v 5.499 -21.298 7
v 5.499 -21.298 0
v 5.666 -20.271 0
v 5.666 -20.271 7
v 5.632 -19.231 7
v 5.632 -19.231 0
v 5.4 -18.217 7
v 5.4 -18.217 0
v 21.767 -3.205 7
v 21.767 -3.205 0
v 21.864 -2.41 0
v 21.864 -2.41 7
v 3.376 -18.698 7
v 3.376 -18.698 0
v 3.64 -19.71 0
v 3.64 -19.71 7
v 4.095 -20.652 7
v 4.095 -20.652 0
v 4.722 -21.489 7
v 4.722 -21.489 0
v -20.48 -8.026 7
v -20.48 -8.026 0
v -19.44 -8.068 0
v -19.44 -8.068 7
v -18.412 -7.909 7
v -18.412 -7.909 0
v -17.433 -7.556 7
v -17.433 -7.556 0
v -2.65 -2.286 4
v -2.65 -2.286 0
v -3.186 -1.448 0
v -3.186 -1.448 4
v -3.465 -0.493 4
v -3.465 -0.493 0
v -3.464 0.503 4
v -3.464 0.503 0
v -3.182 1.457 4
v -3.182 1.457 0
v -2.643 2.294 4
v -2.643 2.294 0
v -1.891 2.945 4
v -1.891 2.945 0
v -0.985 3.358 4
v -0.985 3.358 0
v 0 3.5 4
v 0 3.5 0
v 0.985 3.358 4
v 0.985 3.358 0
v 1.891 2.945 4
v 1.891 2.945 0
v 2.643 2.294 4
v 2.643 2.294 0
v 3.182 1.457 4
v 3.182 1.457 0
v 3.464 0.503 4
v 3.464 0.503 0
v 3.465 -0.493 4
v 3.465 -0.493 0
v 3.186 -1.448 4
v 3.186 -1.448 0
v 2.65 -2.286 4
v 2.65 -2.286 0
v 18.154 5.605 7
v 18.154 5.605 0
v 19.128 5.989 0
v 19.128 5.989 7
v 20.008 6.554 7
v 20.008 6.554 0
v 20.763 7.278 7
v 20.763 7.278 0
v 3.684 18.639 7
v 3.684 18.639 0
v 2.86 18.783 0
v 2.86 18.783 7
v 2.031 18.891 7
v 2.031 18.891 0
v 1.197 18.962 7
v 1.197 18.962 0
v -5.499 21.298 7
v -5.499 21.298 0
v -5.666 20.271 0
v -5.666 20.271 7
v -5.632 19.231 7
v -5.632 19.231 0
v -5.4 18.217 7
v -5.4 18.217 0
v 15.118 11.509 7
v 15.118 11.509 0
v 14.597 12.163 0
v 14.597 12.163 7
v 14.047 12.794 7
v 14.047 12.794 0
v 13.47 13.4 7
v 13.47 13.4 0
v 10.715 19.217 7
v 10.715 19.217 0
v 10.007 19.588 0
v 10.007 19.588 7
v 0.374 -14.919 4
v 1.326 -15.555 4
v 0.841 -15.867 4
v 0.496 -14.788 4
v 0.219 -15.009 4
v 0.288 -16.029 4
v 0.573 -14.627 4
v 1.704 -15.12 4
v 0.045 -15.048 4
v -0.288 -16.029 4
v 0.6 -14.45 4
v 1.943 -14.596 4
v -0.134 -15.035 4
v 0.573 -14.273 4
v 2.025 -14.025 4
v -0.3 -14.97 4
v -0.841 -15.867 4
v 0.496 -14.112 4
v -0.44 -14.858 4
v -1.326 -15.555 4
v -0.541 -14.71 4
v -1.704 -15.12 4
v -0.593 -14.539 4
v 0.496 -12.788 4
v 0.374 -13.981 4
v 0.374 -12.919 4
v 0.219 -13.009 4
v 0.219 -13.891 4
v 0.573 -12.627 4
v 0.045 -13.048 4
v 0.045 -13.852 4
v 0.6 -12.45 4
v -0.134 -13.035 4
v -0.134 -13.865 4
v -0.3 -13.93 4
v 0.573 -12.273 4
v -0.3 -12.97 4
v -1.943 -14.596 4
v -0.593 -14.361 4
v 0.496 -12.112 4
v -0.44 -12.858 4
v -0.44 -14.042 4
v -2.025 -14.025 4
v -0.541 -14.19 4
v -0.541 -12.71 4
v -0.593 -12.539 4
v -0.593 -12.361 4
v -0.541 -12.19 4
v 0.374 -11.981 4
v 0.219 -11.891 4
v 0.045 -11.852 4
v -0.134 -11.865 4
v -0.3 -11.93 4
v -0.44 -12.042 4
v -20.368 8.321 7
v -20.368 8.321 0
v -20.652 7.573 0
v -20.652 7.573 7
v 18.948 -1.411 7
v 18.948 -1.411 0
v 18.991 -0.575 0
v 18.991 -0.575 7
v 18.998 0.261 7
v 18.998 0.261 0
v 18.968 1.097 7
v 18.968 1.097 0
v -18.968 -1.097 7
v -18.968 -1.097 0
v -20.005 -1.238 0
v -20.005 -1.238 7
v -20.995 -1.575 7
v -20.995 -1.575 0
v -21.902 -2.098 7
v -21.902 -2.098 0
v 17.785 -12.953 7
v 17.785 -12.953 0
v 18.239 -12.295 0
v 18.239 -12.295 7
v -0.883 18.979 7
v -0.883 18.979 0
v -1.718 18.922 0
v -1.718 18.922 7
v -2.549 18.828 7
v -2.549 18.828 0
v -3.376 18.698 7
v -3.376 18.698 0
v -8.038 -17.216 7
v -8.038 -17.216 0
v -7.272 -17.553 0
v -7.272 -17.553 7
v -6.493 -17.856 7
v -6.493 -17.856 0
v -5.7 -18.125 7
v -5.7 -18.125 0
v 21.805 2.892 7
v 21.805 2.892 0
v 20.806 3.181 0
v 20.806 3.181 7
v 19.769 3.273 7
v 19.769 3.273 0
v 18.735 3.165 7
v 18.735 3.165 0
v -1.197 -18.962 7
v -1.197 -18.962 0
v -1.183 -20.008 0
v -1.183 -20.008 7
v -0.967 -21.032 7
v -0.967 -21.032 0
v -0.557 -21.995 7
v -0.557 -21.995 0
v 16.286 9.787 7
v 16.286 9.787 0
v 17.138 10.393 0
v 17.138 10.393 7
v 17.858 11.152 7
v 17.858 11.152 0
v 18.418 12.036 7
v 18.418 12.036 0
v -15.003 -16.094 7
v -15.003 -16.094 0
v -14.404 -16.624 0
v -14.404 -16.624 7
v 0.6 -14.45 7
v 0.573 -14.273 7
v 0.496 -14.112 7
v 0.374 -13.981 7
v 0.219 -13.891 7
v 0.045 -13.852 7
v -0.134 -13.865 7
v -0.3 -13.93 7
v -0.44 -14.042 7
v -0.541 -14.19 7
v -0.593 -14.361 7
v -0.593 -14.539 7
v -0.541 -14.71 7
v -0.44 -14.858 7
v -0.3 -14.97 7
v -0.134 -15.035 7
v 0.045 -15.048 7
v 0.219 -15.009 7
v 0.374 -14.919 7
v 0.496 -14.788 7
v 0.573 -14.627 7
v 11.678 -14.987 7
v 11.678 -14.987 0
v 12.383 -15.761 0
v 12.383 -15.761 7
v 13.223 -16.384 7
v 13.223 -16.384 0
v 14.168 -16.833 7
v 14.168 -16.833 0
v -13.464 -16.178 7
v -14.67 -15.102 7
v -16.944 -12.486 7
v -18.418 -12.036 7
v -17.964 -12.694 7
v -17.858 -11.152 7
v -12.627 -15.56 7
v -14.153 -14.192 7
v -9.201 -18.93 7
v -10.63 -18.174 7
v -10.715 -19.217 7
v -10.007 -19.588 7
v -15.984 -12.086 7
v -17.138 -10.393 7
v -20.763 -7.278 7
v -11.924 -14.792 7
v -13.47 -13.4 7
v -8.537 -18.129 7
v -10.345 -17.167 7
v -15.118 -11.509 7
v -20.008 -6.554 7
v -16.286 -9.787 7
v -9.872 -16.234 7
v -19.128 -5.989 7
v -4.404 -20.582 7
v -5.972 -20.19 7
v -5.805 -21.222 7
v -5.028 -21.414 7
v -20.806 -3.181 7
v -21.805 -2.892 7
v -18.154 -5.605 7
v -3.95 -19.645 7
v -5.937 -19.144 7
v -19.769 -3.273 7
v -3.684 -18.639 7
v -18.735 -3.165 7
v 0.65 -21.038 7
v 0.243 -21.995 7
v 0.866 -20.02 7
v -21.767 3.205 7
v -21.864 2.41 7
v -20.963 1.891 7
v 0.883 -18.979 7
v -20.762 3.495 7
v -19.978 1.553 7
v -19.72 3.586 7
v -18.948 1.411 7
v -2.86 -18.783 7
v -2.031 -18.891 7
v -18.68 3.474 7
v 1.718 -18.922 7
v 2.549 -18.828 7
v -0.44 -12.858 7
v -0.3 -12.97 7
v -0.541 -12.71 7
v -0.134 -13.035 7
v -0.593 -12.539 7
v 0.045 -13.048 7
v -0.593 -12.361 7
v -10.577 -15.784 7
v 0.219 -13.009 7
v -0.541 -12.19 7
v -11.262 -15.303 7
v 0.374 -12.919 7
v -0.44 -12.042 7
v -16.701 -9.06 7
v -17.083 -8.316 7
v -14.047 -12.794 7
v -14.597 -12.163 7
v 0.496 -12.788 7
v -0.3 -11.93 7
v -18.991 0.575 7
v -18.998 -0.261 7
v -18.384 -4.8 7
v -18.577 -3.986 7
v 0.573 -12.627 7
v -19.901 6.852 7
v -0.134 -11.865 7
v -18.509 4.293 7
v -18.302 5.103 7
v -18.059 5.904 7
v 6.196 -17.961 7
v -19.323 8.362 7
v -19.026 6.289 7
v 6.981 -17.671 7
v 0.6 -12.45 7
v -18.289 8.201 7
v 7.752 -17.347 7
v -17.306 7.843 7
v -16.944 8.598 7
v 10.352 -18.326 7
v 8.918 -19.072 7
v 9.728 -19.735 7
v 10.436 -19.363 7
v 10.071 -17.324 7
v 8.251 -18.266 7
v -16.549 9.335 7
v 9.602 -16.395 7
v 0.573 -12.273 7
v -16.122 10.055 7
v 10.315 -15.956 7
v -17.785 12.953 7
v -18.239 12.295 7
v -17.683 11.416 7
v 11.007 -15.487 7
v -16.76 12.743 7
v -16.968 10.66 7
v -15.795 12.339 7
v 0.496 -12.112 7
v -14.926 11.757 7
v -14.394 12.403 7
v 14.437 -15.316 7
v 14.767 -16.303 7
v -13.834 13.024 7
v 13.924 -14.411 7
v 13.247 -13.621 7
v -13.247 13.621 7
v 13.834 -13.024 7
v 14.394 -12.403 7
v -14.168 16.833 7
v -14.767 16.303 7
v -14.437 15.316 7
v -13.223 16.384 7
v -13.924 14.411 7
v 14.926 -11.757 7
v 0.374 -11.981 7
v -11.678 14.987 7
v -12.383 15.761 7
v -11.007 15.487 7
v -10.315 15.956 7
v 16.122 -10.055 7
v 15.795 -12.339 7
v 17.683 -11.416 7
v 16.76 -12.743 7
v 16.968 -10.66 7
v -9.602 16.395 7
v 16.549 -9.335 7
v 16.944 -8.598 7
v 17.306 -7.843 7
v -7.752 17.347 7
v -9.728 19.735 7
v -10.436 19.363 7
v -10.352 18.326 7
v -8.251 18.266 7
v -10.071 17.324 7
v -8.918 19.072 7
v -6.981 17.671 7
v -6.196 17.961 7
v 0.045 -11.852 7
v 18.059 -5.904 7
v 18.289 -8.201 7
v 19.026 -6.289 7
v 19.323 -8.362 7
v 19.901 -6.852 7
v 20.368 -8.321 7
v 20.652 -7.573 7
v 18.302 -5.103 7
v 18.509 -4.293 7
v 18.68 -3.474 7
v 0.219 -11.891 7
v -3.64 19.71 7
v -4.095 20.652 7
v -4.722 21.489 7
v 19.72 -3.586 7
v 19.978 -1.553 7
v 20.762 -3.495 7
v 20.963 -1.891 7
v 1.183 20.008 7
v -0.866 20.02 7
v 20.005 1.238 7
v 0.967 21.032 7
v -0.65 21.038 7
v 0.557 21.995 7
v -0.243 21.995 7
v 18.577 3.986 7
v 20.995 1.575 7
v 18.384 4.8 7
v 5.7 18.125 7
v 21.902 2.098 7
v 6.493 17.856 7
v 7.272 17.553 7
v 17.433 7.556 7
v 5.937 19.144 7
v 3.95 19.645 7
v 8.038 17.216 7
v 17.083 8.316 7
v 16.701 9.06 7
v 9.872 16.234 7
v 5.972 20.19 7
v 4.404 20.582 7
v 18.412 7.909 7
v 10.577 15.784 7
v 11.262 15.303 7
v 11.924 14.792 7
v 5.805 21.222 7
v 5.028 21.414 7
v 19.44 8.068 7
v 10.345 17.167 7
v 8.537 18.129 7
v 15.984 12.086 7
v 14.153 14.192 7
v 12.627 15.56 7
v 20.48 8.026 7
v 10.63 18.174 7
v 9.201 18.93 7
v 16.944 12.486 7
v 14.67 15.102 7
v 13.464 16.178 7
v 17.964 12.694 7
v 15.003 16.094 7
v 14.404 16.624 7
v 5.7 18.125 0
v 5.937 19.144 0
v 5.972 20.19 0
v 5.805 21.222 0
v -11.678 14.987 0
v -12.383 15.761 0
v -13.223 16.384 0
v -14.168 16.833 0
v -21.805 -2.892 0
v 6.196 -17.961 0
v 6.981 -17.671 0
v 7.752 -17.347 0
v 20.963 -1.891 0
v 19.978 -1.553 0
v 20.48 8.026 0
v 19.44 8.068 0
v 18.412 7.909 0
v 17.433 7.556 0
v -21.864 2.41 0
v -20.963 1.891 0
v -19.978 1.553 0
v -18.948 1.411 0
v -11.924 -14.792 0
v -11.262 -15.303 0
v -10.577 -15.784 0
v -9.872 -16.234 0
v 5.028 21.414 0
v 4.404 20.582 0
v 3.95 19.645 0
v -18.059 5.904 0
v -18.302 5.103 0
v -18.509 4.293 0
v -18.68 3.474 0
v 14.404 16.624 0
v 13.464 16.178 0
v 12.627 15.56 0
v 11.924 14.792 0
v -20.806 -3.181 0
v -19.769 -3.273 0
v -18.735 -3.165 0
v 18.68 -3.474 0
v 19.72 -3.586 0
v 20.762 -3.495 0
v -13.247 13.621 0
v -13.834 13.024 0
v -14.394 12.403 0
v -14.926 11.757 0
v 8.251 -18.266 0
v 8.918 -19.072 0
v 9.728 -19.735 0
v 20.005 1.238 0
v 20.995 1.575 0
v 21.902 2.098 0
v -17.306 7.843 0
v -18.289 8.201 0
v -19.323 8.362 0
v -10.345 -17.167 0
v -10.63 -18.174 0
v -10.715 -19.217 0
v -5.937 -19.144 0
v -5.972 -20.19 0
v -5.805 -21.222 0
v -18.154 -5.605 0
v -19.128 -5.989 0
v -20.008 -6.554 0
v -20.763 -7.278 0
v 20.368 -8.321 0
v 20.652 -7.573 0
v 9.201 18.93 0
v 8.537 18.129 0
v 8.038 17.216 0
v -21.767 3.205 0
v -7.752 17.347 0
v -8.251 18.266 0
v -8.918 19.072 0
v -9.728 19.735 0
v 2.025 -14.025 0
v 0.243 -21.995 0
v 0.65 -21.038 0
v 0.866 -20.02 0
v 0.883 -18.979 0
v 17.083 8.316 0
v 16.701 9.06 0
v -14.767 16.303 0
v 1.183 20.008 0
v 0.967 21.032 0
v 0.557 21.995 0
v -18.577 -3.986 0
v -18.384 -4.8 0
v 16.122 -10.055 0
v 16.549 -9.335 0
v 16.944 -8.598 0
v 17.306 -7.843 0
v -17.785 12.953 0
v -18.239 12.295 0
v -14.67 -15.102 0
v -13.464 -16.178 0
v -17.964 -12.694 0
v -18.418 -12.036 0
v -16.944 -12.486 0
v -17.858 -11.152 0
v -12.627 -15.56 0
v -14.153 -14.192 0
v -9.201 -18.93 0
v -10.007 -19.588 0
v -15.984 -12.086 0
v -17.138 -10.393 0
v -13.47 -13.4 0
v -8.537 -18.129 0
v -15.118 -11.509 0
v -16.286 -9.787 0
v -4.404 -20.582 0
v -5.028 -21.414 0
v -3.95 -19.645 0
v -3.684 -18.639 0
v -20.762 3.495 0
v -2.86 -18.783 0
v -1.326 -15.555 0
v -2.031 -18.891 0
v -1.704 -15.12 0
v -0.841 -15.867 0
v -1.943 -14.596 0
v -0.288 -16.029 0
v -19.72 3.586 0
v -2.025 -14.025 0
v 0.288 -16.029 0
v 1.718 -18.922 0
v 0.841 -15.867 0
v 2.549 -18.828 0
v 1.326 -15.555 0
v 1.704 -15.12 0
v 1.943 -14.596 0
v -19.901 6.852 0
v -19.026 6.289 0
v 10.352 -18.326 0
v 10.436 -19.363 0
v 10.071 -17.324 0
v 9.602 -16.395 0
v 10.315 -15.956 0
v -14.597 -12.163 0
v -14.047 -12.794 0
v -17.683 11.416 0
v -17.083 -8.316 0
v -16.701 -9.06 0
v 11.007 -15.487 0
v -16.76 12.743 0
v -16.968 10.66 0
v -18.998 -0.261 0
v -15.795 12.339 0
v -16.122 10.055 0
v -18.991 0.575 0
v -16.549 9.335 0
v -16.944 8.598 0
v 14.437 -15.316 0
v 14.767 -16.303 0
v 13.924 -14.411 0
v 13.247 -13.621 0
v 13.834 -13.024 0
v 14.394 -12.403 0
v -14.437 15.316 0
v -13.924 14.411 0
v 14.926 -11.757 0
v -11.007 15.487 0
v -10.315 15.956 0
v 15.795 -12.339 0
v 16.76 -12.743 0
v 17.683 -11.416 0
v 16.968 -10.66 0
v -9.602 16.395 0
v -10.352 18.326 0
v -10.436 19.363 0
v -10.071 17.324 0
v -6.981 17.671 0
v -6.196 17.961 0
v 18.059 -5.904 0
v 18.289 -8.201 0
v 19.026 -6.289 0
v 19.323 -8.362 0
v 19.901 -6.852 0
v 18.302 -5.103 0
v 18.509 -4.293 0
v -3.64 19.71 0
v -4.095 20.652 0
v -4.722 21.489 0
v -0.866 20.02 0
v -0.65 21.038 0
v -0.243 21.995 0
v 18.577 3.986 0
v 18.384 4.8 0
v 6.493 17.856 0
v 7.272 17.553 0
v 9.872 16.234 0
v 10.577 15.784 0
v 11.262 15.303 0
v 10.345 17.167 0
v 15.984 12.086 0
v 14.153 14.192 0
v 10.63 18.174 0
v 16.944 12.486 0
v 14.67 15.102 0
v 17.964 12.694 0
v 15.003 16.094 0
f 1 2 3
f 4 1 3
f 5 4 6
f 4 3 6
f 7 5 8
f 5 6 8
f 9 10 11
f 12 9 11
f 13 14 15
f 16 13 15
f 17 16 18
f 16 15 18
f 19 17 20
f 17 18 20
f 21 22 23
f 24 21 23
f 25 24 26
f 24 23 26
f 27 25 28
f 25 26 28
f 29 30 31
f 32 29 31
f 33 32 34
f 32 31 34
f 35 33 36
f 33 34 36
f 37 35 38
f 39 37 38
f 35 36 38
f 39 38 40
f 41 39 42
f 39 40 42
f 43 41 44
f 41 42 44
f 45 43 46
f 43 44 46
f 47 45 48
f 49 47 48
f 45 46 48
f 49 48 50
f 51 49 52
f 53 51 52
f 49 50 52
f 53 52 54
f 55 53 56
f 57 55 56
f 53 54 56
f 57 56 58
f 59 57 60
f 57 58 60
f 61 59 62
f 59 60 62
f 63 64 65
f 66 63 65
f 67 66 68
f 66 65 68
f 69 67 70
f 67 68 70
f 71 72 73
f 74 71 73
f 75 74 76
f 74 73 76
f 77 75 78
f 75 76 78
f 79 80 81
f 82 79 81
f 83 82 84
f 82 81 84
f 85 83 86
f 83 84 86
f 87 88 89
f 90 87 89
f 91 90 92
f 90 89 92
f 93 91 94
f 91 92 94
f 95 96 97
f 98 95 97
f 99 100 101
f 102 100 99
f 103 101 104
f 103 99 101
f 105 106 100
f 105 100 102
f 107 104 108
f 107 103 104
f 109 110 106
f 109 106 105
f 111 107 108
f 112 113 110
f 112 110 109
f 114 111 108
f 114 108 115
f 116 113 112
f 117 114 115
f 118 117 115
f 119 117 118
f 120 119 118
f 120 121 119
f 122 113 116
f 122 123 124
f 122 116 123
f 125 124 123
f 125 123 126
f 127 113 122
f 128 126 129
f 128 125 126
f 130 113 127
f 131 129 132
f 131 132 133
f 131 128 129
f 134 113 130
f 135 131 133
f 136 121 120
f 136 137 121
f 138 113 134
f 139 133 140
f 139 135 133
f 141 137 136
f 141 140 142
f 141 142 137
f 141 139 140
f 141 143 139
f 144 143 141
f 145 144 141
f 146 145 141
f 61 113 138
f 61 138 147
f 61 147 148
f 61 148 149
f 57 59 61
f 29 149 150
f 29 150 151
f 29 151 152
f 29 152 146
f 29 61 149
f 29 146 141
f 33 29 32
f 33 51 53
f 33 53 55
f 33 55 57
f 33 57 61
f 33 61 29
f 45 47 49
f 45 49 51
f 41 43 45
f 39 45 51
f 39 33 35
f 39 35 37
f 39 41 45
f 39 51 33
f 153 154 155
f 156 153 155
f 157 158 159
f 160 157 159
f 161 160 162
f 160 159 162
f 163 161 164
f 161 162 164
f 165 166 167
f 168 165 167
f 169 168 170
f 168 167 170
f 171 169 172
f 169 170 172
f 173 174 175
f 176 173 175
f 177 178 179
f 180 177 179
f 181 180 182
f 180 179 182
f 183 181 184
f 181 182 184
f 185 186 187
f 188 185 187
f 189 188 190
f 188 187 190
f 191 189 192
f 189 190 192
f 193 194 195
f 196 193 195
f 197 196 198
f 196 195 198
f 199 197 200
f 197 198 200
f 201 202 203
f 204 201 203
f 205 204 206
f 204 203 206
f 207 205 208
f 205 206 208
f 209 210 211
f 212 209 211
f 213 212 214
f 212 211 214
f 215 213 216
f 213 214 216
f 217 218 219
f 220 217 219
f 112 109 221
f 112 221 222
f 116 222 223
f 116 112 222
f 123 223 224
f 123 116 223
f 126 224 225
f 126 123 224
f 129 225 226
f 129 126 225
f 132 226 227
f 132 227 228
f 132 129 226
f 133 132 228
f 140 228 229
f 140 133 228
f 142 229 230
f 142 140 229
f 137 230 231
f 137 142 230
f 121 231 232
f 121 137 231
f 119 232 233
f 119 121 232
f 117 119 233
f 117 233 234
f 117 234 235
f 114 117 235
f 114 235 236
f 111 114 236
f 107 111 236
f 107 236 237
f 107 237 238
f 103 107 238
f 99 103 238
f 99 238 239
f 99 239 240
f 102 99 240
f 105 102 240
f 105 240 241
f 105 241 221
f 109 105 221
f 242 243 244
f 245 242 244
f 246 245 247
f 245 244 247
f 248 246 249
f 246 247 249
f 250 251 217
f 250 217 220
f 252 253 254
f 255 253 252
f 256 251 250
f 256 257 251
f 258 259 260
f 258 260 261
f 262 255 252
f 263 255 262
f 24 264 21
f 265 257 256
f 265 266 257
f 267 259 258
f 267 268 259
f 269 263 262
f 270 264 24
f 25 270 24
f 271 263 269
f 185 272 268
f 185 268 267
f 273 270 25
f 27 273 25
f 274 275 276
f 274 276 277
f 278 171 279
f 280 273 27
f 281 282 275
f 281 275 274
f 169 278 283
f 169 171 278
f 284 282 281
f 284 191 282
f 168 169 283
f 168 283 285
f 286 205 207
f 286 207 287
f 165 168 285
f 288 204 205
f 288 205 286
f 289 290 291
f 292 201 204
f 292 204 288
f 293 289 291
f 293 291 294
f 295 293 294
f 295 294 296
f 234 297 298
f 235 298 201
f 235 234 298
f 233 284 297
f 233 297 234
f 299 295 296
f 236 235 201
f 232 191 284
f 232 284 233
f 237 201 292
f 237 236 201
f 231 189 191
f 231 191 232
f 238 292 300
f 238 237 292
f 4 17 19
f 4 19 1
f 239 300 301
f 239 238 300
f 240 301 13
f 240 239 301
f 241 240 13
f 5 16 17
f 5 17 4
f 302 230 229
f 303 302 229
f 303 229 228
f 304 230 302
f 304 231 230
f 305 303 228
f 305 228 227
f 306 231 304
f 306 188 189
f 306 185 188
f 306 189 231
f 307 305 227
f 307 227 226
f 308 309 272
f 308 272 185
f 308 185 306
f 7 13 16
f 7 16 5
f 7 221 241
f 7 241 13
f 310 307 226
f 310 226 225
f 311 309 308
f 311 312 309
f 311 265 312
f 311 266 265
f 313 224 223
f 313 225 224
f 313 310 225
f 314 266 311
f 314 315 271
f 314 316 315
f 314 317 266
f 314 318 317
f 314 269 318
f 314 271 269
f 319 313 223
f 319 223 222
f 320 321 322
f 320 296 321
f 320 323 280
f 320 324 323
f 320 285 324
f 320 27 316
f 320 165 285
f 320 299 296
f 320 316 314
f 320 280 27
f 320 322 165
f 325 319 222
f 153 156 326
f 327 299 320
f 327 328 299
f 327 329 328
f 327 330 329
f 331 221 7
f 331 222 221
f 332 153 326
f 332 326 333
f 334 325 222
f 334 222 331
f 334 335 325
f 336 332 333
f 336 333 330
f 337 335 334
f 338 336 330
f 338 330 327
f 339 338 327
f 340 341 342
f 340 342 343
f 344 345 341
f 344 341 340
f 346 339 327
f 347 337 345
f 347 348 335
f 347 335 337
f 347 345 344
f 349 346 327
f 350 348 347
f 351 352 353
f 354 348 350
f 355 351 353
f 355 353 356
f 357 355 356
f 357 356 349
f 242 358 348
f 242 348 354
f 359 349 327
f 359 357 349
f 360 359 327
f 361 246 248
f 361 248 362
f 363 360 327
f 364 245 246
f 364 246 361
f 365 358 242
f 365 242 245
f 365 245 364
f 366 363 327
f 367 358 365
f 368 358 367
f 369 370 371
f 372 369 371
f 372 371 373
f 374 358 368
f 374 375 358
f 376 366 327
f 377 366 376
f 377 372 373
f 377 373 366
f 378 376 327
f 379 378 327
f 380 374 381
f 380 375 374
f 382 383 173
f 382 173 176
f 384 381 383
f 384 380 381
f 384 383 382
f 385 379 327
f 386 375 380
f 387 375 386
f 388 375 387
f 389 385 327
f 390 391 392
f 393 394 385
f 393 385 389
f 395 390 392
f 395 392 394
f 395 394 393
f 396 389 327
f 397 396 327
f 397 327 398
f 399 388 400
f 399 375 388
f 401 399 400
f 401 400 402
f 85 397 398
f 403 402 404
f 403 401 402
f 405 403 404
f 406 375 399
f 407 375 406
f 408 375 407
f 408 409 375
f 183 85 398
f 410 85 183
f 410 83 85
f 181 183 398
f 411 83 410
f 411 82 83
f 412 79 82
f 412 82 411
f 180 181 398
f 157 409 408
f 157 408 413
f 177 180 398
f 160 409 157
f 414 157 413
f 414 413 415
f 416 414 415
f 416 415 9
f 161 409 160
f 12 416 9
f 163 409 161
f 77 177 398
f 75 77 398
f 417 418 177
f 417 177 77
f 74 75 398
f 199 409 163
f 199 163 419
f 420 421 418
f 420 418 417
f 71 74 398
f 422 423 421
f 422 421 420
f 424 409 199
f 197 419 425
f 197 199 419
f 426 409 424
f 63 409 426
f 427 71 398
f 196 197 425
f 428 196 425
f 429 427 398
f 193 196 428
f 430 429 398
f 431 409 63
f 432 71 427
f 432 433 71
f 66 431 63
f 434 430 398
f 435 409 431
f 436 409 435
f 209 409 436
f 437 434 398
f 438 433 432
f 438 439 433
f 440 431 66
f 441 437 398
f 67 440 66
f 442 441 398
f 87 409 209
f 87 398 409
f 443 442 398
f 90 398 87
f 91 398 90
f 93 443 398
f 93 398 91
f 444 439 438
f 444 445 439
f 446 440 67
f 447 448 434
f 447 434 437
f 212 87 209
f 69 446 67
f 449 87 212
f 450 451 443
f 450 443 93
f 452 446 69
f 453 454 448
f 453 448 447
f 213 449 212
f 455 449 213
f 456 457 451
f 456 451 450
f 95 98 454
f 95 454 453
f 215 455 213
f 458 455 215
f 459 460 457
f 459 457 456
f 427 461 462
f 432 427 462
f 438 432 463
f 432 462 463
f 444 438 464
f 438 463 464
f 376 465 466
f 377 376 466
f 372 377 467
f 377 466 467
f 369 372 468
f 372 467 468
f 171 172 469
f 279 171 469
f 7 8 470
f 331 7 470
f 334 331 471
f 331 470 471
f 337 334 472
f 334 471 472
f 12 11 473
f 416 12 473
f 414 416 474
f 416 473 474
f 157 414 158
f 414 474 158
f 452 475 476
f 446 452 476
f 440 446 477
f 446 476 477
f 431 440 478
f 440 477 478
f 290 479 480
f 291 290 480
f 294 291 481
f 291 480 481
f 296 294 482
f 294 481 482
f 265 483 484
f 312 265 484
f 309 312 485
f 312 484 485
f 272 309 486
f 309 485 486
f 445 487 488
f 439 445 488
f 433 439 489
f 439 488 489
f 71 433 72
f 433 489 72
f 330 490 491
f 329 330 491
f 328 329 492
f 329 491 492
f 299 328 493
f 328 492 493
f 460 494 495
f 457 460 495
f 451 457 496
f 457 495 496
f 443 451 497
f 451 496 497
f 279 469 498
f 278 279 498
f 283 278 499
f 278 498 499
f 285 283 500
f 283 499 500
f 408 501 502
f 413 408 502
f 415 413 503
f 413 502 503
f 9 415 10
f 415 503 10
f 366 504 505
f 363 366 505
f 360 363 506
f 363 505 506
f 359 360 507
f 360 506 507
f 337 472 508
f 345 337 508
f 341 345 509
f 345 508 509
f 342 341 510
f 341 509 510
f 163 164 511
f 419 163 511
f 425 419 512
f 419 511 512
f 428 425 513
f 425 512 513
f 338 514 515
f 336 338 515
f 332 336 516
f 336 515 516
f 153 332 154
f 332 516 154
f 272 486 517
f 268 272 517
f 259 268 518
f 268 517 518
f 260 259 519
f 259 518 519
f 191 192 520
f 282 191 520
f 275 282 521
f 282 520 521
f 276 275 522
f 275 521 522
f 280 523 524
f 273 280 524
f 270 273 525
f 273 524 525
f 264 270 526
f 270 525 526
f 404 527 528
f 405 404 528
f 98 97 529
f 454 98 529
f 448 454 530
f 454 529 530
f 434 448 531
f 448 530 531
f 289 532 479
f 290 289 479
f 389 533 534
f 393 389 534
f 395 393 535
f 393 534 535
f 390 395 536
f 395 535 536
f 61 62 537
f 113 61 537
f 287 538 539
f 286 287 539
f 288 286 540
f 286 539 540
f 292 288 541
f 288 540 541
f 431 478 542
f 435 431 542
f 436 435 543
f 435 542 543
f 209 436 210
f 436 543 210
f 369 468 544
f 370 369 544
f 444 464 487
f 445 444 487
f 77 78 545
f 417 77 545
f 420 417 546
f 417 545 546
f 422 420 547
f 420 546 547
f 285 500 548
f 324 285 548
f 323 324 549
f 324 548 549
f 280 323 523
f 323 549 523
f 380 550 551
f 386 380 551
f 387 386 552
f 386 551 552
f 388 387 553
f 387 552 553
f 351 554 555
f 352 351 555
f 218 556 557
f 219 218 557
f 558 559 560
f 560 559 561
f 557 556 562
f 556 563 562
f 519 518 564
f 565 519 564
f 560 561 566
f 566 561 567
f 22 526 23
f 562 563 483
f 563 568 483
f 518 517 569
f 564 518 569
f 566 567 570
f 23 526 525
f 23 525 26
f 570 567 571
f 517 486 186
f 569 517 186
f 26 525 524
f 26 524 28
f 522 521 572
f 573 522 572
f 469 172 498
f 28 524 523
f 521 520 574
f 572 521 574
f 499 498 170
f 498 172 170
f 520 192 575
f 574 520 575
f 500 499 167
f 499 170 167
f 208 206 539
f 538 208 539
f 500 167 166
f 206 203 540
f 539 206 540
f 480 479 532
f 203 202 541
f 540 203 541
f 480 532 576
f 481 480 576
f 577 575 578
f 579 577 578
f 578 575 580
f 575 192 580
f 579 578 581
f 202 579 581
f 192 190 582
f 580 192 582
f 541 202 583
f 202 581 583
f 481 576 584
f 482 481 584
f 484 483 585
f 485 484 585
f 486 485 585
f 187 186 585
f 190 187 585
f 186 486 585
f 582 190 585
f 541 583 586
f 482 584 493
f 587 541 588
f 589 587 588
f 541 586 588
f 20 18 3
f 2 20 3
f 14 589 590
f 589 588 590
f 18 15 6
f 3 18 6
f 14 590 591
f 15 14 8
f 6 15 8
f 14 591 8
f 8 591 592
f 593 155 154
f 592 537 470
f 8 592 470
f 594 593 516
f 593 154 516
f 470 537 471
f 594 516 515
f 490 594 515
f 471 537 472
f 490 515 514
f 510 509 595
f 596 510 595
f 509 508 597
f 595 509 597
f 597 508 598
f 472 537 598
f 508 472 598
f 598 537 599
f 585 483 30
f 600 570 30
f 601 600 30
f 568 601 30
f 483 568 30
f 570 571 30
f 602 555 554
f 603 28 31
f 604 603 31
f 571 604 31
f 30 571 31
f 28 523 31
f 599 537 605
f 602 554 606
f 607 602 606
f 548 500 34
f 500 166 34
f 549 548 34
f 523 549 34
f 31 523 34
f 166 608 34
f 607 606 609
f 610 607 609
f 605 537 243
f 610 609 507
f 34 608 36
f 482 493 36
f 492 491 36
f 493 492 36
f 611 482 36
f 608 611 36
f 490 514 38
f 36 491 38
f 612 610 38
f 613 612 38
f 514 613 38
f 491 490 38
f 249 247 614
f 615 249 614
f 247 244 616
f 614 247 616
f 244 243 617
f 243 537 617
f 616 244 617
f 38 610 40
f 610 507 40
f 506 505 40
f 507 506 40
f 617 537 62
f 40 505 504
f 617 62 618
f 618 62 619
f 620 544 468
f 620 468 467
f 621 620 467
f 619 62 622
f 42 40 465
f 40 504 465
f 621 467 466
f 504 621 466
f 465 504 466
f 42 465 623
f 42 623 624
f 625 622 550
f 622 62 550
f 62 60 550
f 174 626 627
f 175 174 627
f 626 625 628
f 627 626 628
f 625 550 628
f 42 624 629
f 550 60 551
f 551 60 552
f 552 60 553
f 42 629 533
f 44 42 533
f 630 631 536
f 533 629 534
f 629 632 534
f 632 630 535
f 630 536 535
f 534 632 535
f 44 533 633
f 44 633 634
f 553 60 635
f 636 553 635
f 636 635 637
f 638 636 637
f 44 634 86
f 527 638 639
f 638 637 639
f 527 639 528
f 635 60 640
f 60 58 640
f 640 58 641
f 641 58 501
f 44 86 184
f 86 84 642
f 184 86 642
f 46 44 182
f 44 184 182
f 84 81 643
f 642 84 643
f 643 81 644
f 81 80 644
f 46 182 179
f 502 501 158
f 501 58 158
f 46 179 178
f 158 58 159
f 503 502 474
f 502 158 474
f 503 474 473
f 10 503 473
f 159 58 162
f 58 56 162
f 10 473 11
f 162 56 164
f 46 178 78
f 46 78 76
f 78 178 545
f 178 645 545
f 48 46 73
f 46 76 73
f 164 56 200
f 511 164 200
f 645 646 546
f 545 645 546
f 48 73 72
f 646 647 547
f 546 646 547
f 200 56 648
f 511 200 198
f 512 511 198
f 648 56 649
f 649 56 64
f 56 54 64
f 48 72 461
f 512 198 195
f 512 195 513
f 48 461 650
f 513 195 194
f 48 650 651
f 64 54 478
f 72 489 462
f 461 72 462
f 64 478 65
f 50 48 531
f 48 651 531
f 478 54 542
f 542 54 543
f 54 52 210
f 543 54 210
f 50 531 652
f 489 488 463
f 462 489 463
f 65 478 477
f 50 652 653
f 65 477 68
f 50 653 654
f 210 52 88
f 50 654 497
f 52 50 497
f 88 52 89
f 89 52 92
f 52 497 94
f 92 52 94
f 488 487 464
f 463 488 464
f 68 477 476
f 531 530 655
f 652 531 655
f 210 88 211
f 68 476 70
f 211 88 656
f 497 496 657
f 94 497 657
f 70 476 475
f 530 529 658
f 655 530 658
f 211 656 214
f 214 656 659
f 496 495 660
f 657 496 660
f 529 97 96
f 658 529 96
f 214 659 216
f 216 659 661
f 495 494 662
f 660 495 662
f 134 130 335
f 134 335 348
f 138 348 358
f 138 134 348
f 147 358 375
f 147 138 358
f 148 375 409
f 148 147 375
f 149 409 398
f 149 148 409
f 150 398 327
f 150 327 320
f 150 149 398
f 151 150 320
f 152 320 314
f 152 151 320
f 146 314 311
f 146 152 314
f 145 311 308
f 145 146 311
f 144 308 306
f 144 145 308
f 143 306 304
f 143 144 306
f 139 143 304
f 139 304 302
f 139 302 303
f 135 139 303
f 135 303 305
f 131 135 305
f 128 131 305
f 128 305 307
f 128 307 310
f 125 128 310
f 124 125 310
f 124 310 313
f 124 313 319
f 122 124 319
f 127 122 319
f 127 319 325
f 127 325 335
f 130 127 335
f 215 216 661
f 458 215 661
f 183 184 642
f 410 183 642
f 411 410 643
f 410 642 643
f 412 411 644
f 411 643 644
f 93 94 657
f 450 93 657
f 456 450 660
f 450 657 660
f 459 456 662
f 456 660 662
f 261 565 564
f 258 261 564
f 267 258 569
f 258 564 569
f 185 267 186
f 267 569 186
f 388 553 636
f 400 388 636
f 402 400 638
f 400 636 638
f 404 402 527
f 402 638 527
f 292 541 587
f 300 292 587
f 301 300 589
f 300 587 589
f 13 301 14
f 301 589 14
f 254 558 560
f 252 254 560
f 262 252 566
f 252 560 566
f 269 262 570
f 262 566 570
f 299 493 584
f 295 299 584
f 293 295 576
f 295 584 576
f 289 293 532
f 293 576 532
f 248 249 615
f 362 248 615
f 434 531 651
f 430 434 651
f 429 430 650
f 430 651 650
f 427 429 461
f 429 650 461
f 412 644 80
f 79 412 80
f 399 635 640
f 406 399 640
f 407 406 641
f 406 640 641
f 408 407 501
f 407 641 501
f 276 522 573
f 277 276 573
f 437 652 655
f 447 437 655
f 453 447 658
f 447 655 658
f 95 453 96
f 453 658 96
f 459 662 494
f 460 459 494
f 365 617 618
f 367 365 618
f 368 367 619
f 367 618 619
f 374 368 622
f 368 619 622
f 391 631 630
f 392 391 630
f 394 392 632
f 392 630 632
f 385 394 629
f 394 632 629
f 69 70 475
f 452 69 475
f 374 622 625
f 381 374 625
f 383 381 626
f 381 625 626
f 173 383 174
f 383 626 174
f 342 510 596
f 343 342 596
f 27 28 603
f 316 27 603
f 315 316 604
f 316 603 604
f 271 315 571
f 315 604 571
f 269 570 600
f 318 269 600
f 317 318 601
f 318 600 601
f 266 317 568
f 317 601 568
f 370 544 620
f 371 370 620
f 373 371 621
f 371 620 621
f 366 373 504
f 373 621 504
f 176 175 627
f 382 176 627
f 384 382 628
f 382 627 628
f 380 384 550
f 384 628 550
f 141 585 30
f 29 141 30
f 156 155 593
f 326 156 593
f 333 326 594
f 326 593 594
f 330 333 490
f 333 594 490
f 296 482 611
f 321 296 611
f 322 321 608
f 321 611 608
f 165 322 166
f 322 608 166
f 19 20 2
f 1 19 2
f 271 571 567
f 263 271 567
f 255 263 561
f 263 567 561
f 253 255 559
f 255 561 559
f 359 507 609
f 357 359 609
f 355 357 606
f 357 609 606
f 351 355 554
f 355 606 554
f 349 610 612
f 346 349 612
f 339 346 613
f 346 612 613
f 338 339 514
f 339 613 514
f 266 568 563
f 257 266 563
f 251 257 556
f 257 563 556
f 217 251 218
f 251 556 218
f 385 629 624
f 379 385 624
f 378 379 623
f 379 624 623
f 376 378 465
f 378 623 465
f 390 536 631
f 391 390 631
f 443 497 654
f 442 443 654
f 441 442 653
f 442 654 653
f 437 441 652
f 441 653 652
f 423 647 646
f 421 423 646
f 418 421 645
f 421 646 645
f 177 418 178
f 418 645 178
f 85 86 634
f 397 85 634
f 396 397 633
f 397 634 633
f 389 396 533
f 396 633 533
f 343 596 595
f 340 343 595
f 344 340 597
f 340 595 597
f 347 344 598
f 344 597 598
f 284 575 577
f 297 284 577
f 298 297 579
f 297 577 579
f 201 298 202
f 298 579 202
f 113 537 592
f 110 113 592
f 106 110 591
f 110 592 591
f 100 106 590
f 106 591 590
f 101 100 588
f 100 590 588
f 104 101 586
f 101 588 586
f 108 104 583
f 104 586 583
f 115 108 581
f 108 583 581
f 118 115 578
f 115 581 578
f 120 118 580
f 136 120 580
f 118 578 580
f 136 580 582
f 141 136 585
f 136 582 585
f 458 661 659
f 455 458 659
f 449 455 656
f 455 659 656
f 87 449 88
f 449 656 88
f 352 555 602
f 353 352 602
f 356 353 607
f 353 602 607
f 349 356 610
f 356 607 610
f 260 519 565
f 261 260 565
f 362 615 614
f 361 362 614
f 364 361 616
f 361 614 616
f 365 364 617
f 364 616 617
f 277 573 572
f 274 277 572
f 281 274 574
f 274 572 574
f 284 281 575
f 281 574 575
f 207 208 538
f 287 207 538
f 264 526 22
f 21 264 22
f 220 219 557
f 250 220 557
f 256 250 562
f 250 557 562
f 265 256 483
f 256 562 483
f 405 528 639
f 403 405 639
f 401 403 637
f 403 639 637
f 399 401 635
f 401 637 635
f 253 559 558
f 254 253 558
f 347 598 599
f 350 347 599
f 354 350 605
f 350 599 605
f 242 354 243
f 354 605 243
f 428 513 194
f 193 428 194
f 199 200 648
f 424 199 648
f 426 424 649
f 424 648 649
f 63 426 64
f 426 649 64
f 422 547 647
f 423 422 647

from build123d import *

# Parameters (mm, degrees)
SKETCH1_R           = 19
BOSS_EXTRUDE2_DEPTH = 7
BOSS_EXTRUDE3_DEPTH = 7
CIRPATTERN1_COUNT   = 26
SKETCH1_7_R         = 0.6
CUT_EXTRUDE1_DEPTH  = 4
SKETCH1_8_R         = 0.6
CUT_EXTRUDE2_DEPTH  = 7


with BuildPart() as part:
    # Sketch1 → Boss-Extrude2 (new body)
    with BuildSketch(Plane.XY):
        Circle(SKETCH1_R)
    extrude(amount=BOSS_EXTRUDE2_DEPTH)

    # Sketch1<6> → Boss-Extrude3 (add)
    with BuildSketch(Plane.XY):
        with BuildLine():
            Line((-0.557497486, -21.995033976), (0.242502514, -21.995033976))
            ThreePointArc((0.242502514, -21.995033976), (0.782724682, -20.5339516), (0.883393299, -18.979452476))
            ThreePointArc((0.883393299, -18.979452476), (-0.157029313, -18.999351089), (-1.196980891, -18.962258219))
            ThreePointArc((-1.196980891, -18.962258219), (-1.099506092, -20.525512733), (-0.557497486, -21.995033976))
        make_face()
    boss_extrude3 = extrude(amount=BOSS_EXTRUDE3_DEPTH)

    # CirPattern1: Boss-Extrude3 ×26 about axis
    cirpattern1_axis = Axis((0, 0, 0), (0, 0, 1))
    for i in range(1, CIRPATTERN1_COUNT):
        add(boss_extrude3.rotate(cirpattern1_axis, i * 360 / CIRPATTERN1_COUNT))

    # Sketch1<7> → Cut-Extrude1 (cut)
    with BuildSketch(Plane.XY):
        with BuildLine():
            Line((-2.025, -14.025), (-2.65, -2.286372673))
            ThreePointArc((-2.65, -2.286372673), (0, 3.5), (2.65, -2.286372673))
            Line((2.65, -2.286372673), (2.025, -14.025))
            ThreePointArc((2.025, -14.025), (0, -16.05), (-2.025, -14.025))
        make_face()
        with Locations((0, -14.45)):
            Circle(SKETCH1_7_R, mode=Mode.SUBTRACT)
        with Locations((0, -12.45)):
            Circle(SKETCH1_7_R, mode=Mode.SUBTRACT)
    extrude(amount=CUT_EXTRUDE1_DEPTH, mode=Mode.SUBTRACT)

    # Sketch1<8> → Cut-Extrude2 (cut)
    with BuildSketch(Plane.XY):
        with Locations((0, -14.45)):
            Circle(SKETCH1_8_R)
        with Locations((0, -12.45)):
            Circle(SKETCH1_8_R)
    extrude(amount=CUT_EXTRUDE2_DEPTH, mode=Mode.SUBTRACT)


solid = part.part
